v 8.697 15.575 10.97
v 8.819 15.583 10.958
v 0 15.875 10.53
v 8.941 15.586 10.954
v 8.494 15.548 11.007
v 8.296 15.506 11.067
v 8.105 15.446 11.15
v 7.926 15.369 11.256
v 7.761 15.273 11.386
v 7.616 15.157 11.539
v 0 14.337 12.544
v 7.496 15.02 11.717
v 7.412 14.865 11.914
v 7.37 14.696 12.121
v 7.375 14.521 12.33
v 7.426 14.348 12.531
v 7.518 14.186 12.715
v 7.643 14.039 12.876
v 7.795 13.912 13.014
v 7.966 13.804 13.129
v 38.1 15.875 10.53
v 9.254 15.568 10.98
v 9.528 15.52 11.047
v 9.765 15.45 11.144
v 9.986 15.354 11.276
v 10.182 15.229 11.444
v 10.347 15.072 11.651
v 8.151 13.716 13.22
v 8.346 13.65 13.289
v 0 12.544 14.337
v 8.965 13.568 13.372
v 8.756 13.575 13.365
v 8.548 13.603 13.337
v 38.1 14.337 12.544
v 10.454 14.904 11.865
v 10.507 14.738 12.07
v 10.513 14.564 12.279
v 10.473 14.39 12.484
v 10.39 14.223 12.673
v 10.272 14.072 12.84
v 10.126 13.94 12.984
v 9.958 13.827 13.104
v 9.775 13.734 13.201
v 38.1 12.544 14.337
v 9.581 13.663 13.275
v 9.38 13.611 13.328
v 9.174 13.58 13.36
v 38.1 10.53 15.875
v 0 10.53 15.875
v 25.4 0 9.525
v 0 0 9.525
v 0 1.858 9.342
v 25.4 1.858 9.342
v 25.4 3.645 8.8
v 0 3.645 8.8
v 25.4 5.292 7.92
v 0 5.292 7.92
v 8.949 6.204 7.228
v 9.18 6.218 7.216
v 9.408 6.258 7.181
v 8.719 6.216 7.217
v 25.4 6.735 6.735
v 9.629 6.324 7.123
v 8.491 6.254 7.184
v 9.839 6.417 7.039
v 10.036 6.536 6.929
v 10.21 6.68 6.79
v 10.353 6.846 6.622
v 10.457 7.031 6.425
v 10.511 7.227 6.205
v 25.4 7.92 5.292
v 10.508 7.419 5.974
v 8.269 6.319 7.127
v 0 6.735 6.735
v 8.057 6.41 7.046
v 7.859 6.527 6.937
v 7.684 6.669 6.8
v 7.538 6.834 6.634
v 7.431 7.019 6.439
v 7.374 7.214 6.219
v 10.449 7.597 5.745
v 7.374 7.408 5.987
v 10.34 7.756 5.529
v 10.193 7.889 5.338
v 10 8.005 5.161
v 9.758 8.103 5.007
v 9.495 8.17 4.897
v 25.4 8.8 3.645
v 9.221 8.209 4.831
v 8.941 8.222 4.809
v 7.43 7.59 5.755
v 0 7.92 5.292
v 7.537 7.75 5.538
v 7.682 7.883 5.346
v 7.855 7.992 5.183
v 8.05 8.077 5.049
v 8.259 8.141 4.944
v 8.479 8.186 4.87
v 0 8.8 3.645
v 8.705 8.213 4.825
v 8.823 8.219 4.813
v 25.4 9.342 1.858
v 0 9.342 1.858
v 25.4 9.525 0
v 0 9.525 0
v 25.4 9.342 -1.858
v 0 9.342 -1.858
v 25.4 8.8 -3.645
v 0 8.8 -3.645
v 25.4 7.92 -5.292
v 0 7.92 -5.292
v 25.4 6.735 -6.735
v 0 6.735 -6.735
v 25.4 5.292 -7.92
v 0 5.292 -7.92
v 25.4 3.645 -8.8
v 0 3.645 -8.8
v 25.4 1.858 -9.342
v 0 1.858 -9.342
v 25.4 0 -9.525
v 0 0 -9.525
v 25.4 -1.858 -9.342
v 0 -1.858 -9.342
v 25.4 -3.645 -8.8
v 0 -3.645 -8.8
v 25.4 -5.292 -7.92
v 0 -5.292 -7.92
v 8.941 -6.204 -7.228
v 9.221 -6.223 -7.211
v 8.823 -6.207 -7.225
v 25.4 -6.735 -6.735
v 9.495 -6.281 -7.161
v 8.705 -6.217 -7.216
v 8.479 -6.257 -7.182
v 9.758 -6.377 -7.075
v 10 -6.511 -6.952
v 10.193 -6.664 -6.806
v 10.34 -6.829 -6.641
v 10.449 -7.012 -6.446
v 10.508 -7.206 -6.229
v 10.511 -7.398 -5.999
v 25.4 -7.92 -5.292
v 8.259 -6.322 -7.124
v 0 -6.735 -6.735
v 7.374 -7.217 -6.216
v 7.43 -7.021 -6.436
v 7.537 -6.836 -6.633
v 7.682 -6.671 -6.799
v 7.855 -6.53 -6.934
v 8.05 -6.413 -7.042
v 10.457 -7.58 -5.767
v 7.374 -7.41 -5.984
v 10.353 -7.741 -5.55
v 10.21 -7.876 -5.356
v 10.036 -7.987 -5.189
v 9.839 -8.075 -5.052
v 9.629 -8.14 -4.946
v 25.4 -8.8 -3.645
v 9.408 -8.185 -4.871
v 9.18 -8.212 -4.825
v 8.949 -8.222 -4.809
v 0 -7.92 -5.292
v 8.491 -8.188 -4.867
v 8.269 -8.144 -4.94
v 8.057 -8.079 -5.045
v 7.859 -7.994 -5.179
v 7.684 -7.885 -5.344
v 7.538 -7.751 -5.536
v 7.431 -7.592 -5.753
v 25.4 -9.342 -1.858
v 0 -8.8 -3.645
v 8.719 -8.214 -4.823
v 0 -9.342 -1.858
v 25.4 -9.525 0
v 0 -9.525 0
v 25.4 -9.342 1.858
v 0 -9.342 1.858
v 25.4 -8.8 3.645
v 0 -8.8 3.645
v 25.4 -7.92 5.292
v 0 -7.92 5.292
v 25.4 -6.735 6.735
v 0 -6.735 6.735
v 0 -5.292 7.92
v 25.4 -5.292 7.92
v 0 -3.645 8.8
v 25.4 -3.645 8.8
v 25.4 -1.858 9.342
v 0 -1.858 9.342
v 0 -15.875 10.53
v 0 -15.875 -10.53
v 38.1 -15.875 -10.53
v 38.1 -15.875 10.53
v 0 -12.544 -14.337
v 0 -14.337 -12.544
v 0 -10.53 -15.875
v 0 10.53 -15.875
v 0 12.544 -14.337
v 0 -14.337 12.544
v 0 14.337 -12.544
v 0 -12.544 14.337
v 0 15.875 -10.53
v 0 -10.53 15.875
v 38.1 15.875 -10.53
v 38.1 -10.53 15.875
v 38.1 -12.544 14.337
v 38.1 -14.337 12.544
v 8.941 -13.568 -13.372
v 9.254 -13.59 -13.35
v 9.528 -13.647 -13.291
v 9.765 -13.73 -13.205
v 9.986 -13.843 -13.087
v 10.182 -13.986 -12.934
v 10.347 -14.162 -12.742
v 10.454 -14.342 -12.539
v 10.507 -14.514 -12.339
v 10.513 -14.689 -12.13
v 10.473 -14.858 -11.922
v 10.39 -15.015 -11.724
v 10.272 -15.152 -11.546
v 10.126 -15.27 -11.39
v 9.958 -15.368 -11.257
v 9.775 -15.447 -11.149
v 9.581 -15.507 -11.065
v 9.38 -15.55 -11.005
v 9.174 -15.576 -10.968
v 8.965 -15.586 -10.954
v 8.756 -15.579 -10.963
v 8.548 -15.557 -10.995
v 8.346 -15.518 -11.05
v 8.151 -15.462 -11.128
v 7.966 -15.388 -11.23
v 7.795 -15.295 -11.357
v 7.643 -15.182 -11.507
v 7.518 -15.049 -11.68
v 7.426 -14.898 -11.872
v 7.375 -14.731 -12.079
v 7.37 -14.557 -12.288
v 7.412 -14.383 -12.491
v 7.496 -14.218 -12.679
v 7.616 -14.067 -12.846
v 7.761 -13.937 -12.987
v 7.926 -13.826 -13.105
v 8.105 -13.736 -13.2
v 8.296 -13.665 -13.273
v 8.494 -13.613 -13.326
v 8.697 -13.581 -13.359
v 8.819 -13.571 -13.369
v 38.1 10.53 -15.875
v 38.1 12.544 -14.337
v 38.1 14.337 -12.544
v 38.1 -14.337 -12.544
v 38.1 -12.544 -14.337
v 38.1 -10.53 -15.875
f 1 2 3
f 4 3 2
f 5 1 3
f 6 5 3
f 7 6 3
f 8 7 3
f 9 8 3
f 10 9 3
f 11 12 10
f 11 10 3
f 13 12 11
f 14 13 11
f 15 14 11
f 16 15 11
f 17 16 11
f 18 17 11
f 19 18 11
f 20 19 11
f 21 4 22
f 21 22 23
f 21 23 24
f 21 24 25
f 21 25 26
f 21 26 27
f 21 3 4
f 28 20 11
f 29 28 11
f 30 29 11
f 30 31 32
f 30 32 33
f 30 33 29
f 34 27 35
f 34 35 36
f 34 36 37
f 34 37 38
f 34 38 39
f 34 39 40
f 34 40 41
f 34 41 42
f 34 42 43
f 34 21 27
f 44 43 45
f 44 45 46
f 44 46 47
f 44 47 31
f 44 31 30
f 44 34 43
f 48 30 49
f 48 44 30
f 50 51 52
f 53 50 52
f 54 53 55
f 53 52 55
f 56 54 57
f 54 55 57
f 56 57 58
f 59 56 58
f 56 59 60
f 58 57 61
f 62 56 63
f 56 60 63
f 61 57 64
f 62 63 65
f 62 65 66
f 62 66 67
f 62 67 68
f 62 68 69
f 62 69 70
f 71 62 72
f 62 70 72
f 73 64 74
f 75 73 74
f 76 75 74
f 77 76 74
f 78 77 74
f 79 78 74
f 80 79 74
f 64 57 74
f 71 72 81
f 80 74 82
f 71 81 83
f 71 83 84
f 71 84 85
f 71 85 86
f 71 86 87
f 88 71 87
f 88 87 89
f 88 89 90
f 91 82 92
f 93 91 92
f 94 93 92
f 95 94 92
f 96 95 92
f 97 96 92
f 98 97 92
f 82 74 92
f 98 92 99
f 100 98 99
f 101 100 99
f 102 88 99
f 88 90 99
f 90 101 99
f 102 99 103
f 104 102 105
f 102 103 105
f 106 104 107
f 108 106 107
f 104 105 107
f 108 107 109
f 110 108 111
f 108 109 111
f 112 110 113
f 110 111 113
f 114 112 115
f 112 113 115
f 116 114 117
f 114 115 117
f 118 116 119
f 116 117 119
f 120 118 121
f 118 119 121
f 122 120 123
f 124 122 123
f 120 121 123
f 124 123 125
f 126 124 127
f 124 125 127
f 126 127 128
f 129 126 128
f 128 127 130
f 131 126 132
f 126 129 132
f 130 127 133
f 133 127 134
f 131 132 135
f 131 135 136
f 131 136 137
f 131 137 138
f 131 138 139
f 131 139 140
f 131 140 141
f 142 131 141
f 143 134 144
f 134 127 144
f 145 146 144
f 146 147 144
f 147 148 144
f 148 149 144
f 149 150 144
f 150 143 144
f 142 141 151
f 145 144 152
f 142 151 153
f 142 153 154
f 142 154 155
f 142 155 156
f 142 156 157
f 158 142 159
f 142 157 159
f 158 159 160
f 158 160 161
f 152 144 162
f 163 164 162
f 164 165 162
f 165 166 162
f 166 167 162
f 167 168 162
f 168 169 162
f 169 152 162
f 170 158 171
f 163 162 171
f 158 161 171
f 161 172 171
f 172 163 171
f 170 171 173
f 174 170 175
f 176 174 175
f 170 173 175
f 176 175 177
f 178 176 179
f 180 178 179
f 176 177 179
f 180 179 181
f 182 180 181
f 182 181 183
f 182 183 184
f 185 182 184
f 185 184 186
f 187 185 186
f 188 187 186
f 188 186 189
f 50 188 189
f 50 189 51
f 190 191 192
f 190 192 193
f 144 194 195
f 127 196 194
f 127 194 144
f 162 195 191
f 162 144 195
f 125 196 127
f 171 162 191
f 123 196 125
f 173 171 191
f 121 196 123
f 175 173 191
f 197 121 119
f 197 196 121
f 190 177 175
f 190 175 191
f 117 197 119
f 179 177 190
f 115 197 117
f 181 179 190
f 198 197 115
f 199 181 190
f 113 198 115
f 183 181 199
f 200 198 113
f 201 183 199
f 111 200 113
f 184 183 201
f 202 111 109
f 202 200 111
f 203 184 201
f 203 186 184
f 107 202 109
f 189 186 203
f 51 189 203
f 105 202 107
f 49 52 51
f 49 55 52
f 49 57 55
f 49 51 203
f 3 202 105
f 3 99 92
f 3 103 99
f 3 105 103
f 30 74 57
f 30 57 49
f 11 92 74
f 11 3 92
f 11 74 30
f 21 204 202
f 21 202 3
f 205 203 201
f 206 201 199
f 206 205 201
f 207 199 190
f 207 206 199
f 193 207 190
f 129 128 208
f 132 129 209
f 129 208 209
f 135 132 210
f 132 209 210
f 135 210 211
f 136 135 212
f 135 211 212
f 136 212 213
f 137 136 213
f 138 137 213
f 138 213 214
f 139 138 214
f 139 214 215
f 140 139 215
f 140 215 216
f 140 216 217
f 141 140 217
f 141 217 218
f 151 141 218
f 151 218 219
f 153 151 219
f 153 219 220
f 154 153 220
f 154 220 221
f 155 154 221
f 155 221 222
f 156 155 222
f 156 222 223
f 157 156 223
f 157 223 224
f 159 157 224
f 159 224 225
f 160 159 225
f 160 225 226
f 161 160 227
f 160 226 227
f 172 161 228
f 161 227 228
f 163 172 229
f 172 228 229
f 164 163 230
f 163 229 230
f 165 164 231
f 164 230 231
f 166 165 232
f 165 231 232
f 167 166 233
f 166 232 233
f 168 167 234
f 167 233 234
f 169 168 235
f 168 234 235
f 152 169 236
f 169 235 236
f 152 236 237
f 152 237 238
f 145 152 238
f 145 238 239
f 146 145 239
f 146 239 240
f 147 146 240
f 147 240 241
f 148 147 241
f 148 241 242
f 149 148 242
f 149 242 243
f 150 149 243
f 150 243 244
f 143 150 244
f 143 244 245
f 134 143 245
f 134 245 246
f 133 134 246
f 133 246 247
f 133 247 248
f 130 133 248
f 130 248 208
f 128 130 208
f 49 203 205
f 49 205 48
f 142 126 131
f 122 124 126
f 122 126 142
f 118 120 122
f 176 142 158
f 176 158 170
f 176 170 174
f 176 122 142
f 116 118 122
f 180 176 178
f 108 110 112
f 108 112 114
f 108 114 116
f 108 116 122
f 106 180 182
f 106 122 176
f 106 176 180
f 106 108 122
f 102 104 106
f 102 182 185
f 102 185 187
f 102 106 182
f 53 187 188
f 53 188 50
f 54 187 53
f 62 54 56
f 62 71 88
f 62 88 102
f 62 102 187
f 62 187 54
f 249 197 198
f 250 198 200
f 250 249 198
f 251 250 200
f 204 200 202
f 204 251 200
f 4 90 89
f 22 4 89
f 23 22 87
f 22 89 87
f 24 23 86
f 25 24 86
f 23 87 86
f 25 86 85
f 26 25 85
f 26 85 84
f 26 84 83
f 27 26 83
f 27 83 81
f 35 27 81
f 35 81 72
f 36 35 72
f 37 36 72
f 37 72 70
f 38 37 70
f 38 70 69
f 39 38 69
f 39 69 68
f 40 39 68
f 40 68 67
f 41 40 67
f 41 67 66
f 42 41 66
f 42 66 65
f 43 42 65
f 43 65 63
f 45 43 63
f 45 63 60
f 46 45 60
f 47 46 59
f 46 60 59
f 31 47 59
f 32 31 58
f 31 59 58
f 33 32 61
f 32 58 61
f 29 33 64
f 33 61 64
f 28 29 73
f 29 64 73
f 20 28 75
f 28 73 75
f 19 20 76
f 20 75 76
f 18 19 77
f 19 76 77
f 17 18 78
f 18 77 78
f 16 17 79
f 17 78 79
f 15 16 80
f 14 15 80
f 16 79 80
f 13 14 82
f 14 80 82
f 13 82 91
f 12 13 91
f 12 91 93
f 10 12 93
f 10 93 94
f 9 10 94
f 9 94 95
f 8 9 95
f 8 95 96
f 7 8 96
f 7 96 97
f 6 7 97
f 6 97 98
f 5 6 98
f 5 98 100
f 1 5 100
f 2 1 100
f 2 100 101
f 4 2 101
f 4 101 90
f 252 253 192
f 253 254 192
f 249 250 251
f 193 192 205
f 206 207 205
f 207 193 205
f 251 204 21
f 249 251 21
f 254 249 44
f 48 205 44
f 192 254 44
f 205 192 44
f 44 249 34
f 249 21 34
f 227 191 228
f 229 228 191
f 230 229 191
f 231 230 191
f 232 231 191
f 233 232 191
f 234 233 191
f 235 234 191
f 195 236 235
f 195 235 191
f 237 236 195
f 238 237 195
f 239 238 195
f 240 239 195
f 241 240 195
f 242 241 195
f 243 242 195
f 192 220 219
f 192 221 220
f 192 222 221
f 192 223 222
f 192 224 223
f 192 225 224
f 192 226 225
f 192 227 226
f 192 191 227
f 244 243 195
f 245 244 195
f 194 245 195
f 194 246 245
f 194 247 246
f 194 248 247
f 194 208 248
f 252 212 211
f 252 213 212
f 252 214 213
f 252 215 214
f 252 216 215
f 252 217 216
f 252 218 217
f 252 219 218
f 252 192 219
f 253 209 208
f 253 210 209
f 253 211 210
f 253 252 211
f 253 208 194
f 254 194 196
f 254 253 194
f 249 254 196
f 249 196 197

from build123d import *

# Parameters (mm, degrees)
TAP_DRILL_FOR_M3_HELICOIL1_D = 3.15
SKETCH10_W                   = 44.45
SKETCH10_H                   = 44.45
SKETCH10_W_2                 = 31.75
SKETCH10_H_2                 = 31.75
CUT_EXTRUDE2_DEPTH           = 39.1000001
SKETCH11_R                   = 9.525
CUT_EXTRUDE3_DEPTH           = 25.4


with BuildPart() as part:
    # Sketch1 → Revolve1 (revolve)
    with BuildSketch(Plane(origin=(0, 0, 0), x_dir=(1, 0, 0), z_dir=(0, 1, 0))):
        Polygon((0, 0), (0, 19.05), (38.1, 19.05), (38.1, 9.525), (38.1, 0), align=None)
    revolve(axis=Axis((0, 0, 0), (1, 0, 0)))

    # Tap Drill for M3 Helicoil1 (through all)
    with Locations(Plane(origin=(8.941446853, 14.626722755, 12.204977732), x_dir=(0, -0.640681246, 0.767806969), z_dir=(0, 0.767806969, 0.640681246))):
        with Locations((0, 0)):
            Hole(TAP_DRILL_FOR_M3_HELICOIL1_D / 2)

    # Sketch10 → Cut-Extrude2 (cut, through all)
    with BuildSketch(Plane.ZY):
        Rectangle(SKETCH10_W, SKETCH10_H)
        Rectangle(SKETCH10_W_2, SKETCH10_H_2, mode=Mode.SUBTRACT)
    extrude(amount=-CUT_EXTRUDE2_DEPTH, mode=Mode.SUBTRACT)

    # Sketch11 → Cut-Extrude3 (cut)
    with BuildSketch(Plane.ZY):
        Circle(SKETCH11_R)
    extrude(amount=-CUT_EXTRUDE3_DEPTH, mode=Mode.SUBTRACT)


solid = part.part
